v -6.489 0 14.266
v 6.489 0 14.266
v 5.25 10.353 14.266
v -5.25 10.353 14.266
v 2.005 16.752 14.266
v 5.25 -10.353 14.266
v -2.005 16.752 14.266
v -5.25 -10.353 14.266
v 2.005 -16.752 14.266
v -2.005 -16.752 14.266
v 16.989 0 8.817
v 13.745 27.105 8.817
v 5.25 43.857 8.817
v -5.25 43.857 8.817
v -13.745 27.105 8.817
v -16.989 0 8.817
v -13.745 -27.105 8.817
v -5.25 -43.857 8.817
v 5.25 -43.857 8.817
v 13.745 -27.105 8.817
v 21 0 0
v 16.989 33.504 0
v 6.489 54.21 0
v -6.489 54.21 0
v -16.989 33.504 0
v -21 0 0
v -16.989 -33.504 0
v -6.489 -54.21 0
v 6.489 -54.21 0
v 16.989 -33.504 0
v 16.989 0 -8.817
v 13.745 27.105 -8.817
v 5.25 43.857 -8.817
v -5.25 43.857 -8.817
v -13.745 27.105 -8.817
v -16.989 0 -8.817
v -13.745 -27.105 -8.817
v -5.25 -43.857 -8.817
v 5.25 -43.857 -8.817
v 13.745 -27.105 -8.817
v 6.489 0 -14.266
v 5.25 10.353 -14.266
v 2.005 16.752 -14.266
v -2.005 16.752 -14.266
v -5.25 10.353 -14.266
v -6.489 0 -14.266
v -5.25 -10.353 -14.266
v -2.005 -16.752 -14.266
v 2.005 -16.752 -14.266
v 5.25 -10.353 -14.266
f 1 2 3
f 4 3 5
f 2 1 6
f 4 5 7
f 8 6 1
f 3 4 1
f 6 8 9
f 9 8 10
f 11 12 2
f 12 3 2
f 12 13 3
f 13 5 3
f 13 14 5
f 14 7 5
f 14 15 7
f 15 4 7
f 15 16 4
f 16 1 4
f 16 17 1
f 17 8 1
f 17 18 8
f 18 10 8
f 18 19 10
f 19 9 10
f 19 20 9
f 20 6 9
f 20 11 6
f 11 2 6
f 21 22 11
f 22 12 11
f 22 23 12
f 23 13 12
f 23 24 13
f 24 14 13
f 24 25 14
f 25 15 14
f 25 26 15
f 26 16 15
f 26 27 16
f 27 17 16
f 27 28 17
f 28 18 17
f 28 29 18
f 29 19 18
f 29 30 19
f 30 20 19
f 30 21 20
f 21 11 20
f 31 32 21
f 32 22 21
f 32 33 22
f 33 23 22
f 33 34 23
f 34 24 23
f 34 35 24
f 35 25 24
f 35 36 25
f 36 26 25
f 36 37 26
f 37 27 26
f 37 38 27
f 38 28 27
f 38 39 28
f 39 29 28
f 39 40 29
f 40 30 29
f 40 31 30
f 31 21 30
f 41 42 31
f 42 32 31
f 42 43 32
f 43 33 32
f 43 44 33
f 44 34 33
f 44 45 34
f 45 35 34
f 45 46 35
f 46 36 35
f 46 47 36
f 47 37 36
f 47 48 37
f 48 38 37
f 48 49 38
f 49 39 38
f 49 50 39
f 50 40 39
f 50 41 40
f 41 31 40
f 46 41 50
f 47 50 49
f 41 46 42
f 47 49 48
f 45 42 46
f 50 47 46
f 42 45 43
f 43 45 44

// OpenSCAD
// Generated by SolidPython 1.0.1 on 2020-07-29 00:46:48


scale(v = [7, 19, 5]) {
	sphere(r = 3);
}
/***********************************************
*********      SolidPython code:      **********
************************************************
 
# import packages: SolidPython
from solid import *
from solid.utils import *
from itertools import chain, combinations, permutations


class Resize:

    def __init__(self, scad_file):
        self.scad_file = scad_file
        #self.scad_file = import_scad(scad_file)
        # cone/cylinder param:
        self.r1 = 0
        self.r2 = 0
        self.h = 0
        # rectangular prism param:
        self.w = 0
        self.l = 0
        # ellipse param:
        self.r = 0

    # import OpenScad code (file name corresponds to shape)


    # classify shape + parameters
    def assign(self, param1, param2, param3):
        if self.scad_file == 'cone.scad':
            self.r1 = param1
            self.r2 = param2
            self.h = param3
        elif self.scad_file == 'cylinder.scad':
            self.r1 = param1
            self.r2 = param2
            self.h = param3
        elif self.scad_file == 'rectangularPrism.scad':
            self.h = param1
            self.l = param2
            self.w = param3
        else:
            self.r = param1
            self.h = param2

    # resize parameters
    def iterate(self):
        x = range(3, 20, 2)
        i = 1
        if self.scad_file == 'cone.scad':
            tempList = list(permutations(x, 2))
            for temp in tempList:
                param1 = temp[0]
                param2 = temp[1]
                filepath = 'produced_scad_files/' + 'cone' + str(param1) + '_' + str(param2) + '_' + '.scad'
                scad_render_to_file(cylinder(h=param1, r1=param2, r2=0), filepath)

        elif self.scad_file == 'cylinder.scad':
            tempList = list(permutations(x, 3))
            for temp in tempList:
                param1 = temp[0]
                param2 = temp[1]
                filepath = 'produced_scad_files/' + 'cylinder' + str(param1) + '_' + str(param2) + '_' + '.scad'
                scad_render_to_file(cylinder(h=param1, r1=param2, r2=param2), filepath)

        elif self.scad_file == 'rectangularPrism.scad':
            tempList = list(permutations(x, 3))
            for temp in tempList:
                param1 = temp[0]
                param2 = temp[1]
                param3 = temp[2]
                filepath = 'produced_scad_files/' + 'rectangularPrism' + str(param1) + '_' + str(param2) + '_' + str(
                    param3) + '.scad'
                scad_render_to_file(cube(size=(param1, param2, param3)), filepath)

        elif self.scad_file == 'ellipse.scad':
            tempList = list(permutations(x, 4))
            for temp in tempList:
                param1 = temp[0]
                param2 = temp[1]
                param3 = temp[2]
                param4 = temp[3]
                filepath = 'produced_scad_files/' + 'ellipse' + str(param1) + '_' + str(param2) + '_' + str(param3) + '_' + str(param4) + '.scad'
                scad_render_to_file(scale([param1, param2, param3])(sphere(r=param4)), filepath)

    def render_to_scadfile(self):
        scad_render_to_file(scad, 'example.scad') 
 
************************************************/
